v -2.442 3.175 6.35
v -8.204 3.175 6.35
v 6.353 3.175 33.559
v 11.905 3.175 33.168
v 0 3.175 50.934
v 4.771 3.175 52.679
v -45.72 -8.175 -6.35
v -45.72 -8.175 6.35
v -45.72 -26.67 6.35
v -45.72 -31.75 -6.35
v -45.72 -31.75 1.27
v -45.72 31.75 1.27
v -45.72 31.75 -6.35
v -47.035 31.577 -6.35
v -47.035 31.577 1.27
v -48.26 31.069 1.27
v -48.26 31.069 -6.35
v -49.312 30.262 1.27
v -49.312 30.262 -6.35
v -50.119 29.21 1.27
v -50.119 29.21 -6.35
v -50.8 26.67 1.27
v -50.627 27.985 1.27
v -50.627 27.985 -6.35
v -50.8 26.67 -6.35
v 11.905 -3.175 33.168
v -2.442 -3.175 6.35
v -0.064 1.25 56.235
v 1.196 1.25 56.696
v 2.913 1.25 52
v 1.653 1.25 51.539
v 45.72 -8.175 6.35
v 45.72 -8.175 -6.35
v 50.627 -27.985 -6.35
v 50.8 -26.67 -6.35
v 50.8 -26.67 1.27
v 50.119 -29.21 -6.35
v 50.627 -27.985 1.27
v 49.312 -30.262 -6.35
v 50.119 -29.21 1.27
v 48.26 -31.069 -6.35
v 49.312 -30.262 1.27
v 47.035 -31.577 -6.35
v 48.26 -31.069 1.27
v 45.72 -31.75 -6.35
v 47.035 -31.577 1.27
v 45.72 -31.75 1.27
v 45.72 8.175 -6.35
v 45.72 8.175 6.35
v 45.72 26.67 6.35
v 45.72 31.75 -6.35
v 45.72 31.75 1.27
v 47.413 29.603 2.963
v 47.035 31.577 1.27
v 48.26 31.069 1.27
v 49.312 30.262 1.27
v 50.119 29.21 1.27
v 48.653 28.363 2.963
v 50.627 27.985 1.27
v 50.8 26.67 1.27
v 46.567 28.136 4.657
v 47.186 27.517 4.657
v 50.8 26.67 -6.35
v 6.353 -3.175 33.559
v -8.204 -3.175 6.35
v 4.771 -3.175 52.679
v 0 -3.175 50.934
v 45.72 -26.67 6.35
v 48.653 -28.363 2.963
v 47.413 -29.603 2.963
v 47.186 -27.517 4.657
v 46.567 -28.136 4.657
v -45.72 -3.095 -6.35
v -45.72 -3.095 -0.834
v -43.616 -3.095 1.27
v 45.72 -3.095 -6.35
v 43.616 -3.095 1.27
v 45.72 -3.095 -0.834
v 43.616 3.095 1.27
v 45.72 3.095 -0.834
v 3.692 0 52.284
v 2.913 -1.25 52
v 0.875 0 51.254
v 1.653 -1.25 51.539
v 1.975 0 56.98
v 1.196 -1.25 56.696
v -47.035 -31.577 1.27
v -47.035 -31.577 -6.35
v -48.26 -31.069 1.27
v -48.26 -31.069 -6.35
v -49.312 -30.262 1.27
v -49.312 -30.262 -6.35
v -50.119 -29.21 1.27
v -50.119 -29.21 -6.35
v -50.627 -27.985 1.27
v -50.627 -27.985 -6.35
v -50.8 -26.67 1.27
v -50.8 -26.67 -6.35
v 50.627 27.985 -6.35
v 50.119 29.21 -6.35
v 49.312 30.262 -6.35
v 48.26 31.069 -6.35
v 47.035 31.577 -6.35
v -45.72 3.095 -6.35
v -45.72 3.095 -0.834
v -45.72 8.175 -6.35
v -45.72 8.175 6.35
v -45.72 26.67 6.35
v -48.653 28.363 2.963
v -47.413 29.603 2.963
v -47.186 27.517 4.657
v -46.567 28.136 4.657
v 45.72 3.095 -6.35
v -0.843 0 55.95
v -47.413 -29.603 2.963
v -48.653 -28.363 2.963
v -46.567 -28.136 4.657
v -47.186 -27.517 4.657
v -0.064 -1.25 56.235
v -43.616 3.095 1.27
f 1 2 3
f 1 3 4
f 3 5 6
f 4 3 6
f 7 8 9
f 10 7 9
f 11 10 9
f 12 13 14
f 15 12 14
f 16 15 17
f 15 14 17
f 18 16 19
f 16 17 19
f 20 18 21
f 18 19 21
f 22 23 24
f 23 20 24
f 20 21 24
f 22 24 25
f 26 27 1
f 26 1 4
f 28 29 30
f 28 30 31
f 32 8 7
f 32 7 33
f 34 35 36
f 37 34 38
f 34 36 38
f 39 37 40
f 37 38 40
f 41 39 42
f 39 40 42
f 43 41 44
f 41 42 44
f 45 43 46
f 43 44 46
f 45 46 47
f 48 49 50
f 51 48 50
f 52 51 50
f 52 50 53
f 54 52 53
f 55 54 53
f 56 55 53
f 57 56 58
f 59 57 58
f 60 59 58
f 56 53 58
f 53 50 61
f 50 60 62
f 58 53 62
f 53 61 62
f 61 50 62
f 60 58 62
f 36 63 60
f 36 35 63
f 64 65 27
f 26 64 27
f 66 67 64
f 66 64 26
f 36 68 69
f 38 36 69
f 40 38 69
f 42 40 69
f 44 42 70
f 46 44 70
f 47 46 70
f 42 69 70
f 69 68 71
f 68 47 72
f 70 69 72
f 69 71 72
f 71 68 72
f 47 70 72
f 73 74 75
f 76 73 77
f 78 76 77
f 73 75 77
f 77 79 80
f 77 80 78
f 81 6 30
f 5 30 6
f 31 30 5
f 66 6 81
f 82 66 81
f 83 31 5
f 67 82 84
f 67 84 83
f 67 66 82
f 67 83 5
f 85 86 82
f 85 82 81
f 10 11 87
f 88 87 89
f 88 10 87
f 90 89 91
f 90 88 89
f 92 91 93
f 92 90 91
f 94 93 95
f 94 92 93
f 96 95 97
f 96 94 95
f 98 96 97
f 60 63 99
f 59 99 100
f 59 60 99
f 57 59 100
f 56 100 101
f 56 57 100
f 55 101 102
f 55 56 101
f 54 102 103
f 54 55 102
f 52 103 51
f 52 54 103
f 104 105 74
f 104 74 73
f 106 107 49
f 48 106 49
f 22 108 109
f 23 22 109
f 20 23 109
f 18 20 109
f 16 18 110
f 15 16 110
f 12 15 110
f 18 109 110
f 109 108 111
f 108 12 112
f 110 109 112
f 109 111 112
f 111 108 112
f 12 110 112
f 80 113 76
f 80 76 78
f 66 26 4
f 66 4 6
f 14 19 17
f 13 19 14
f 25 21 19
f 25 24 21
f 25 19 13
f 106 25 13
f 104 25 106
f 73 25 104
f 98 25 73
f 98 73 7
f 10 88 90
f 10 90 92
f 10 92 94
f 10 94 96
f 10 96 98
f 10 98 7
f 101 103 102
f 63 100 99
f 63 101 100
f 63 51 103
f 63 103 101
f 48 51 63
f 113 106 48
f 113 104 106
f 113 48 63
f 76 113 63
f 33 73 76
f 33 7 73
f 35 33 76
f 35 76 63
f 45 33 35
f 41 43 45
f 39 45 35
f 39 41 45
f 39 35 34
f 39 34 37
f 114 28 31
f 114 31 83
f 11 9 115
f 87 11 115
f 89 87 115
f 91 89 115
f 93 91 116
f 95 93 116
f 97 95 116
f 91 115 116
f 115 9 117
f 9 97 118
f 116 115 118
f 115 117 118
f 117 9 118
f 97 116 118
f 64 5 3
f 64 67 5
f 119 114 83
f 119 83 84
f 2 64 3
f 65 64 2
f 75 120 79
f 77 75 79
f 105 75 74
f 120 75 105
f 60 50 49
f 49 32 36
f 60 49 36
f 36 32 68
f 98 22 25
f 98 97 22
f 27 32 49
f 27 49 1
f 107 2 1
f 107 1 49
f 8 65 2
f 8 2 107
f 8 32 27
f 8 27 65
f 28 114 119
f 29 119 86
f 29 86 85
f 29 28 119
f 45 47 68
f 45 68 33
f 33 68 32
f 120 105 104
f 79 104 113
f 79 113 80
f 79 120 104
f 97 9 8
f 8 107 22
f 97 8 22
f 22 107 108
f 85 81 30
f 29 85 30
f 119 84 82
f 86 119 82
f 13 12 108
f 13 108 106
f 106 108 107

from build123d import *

# Parameters (mm, degrees)
F1_DEPTH     = 31.75
F2_DEPTH     = 3.175
F3_R         = 5.08
F4_SIZE      = 5.08
F6_DEPTH     = 5
F7_W         = 91.44
F7_H         = 18.495
F7_H_2       = 5.2874810565
F8_DEPTH     = 12.701
F9_T         = 5.08
F9_T3_DEPTH  = 22.86
F9_T5_DEPTH  = 16.51
F9_T7_DEPTH  = 15.9213350007
F9_T9_DEPTH  = 11.66
F9_T11_DEPTH = 11.5016876048
F9_T13_DEPTH = 11.66
F9_T15_DEPTH = 11.66
F9_T17_DEPTH = 11.5016876048
F9_T19_DEPTH = 11.66


# Not quite as in the source:
# - a shell that OpenCascade refuses in one call is made with other operations: the cavity is built on its own and cut out


with BuildPart() as f1:
    # F0 (on Front) → F1 (new body, symmetric)
    with BuildSketch(Plane.XZ):
        Polygon((50.8, -6.35), (50.8, 6.35), (-2.4423953146, 6.35), (-8.2037303153, 6.35), (-50.8, 6.35), (-50.8, -6.35), align=None)
    extrude(amount=F1_DEPTH, both=True)

    # F0 (on Front) → F2 (join, symmetric)
    with BuildSketch(Plane.XZ):
        Polygon((-8.2037303153, 6.35), (-2.4423953146, 6.35), (11.905341187, 33.1679385818), (4.7710500911, 52.6789357495), (0, 50.9343780577), (6.3533243835, 33.5591837482), align=None)
    extrude(amount=F2_DEPTH, both=True)

    # F3
    f3_edges = [f1.edges().sort_by_distance(p)[0] for p in [
        (-50.8, -31.75, 0),
        (50.8, -31.75, 0),
        (50.8, 31.75, 0),
        (-50.8, 31.75, 0),
    ]]
    fillet(f3_edges, radius=F3_R)

    # F4
    f4_edges = [f1.edges().sort_by_distance(p)[0] for p in [
        (50.8, 0, 6.35),
    ]]
    chamfer(f4_edges, length=F4_SIZE)

    # F5 (on face) → F6 (join)
    with BuildSketch(Plane(origin=(-16.4279316214, 0, 44.9274248875), x_dir=(0.9391830795, 0, 0.3434168651), z_dir=(-0.3434168651, 0, 0.9391830795))):
        Polygon((20.5937571299, 1.25), (19.2520695251, 1.25), (18.4229133275, 0), (19.2520695251, -1.25), (20.5937571299, -1.25), (21.4229133275, 0), align=None)
    extrude(amount=F6_DEPTH)

    # F7 (on face) → F8 (cut, through all)
    with BuildSketch(Plane.XY.offset(6.35)):
        with Locations((0, -17.4225)):
            Rectangle(F7_W, F7_H)
        with Locations((0, 17.4225)):
            Rectangle(F7_W, F7_H)
        with Locations((0, -29.3137405282)):
            Rectangle(F7_W, F7_H_2)
        with Locations((0, 29.3137405282)):
            Rectangle(F7_W, F7_H_2)
    extrude(amount=-F8_DEPTH, mode=Mode.SUBTRACT)

    # F9: shell of thickness 5.08, made by hand


with BuildPart() as f9_core1:
    # F9_t2: copy of F1
    add(f1.part)

    # the walls: a layer under each face that stays
    f9_faces = [f9_core1.faces().sort_by_distance(p)[0] for p in [
        (50.8, 0, -2.54),
        (48.26, 0, 3.81),
        (47.5160512242, 28.4660512242, 3.81),
        (45.72, 19.9625, 0),
        (0, 0, 6.35),
        (45.72, -19.9625, 0),
        (47.5160512242, -28.4660512242, 3.81),
        (-50.8, 0, -2.54),
        (-45.72, -19.9625, 0),
        (0, -8.175, 0),
        (0, 8.175, 0),
        (-45.72, 19.9625, 0),
        (-48.26, 0, 3.81),
        (-0.9252029659, 0, 19.9545918741),
        (8.55382927, 3.175, 29.5144678748),
        (8.55382927, -3.175, 29.5144678748),
        (4.7314729362, 0, 19.7589692909),
        (-47.5160512242, 28.4660512242, 3.81),
        (-47.5160512242, -28.4660512242, 3.81),
        (3.1766621917, 0, 42.246780903),
        (8.3381956391, 0, 42.9234371656),
        (3.975875076, 2.1166666667, 52.3881761342),
        (2.444199191, 0.625, 54.4899992105),
        (1.4247893073, 1.25, 54.1172470239),
        (0.4053794236, 0.625, 53.7444948373),
        (0.4053794236, -0.625, 53.7444948373),
        (1.4247893073, -1.25, 54.1172470239),
        (2.444199191, -0.625, 54.4899992105),
        (0.5662471447, 0, 56.4652047226),
    ]]
    thicken(f9_faces, amount=-F9_T, mode=Mode.SUBTRACT)

    # F9_s4 → F9_t3 (cut)
    with BuildSketch(Plane.XY.offset(-11.43)):
        Polygon((45.6692, 8.2258), (50.8, 8.175), (50.8, 3.095), (45.72, 3.095), align=None)
        Polygon((45.6692, -8.2258), (50.8, -8.175), (50.8, -3.095), (45.72, -3.095), align=None)
        Polygon((-45.6692, -8.2258), (-50.8, -8.175), (-50.8, -3.095), (-45.72, -3.095), align=None)
        Polygon((-45.6692, 8.2258), (-45.72, 3.095), (-50.8, 3.095), (-50.8, 8.175), align=None)
    extrude(amount=F9_T3_DEPTH, mode=Mode.SUBTRACT)

    # F9_s6 → F9_t5 (cut)
    with BuildSketch(Plane.XZ.offset(-8.255)):
        Polygon((-8.2485227119, 6.424764165), (-8.2037303153, 1.27), (-5.1602217701, 1.27), (-3.7244906507, 3.9535835029), align=None)
        Polygon((-2.3976029179, 6.376835835), (-2.4423953146, 1.27), (-10.9215566565, 1.27), (-6.9216349791, 8.7464164971), align=None)
        Polygon((6.2608214864, 33.5657023365), (10.832564048, 31.1627672512), (11.9053411319, 33.1679385857), (11.1243744273, 35.3037414227), align=None)
    extrude(amount=F9_T5_DEPTH, mode=Mode.SUBTRACT)

    # F9_s8 → F9_t7 (cut)
    with BuildSketch(Plane.YZ.offset(-13.2837303153)):
        Polygon((3.2258, 6.4008), (3.175, 1.27), (-1.905, 1.27), (-1.905, 6.35), align=None)
        Polygon((-3.2258, 6.4008), (-3.175, 1.27), (1.905, 1.27), (1.905, 6.35), align=None)
    extrude(amount=F9_T7_DEPTH, mode=Mode.SUBTRACT)

    # F9_s10 → F9_t9 (cut)
    with BuildSketch(Plane(origin=(8.7850864423, -14.1016340866, 3.2123096243), x_dir=(-0.8487666121, -0.5287676599, 0), z_dir=(-0.5191529807, 0.8333333333, -0.1898308147))):
        Polygon((-3.1675232496, 51.0265185517), (-4.6144586839, 46.1037076546), (0.2449508944, 44.6229853476), (1.7256732014, 49.4823949258), align=None)
    extrude(amount=F9_T9_DEPTH, mode=Mode.SUBTRACT)

    # F9_s12 → F9_t11 (cut)
    with BuildSketch(Plane(origin=(24.1123582833, 0, 8.8168011877), x_dir=(0, 1, 0), z_dir=(-0.9391830795, 0, -0.3434168651))):
        Polygon((1.3008, -47.8875060361), (1.25, -42.7567060361), (-3.83, -42.7567060361), (-3.83, -47.8367060361), align=None)
    extrude(amount=F9_T11_DEPTH, mode=Mode.SUBTRACT)

    # F9_s14 → F9_t13 (cut)
    with BuildSketch(Plane(origin=(8.7028980905, 13.9697070906, 3.1822570534), x_dir=(0.8487666121, -0.5287676599, 0), z_dir=(-0.5191529807, -0.8333333333, -0.1898308147))):
        Polygon((0.6788933364, 50.2682021828), (2.2230169623, 45.3750057318), (7.0824265406, 46.8557280388), (5.6017042336, 51.7151376171), align=None)
    extrude(amount=F9_T13_DEPTH, mode=Mode.SUBTRACT)

    # F9_s16 → F9_t15 (cut)
    with BuildSketch(Plane(origin=(2.6495743357, -4.253040424, 0.9688297542), x_dir=(0.8487666121, 0.5287676599, 0), z_dir=(0.5191529807, -0.8333333333, 0.1898308147))):
        Polygon((0.6788933364, 50.2682021828), (2.2230169623, 45.3750057318), (7.0824265406, 46.8557280388), (5.6017042336, 51.7151376171), align=None)
    extrude(amount=F9_T15_DEPTH, mode=Mode.SUBTRACT)

    # F9_s18 → F9_t17 (cut)
    with BuildSketch(Plane(origin=(13.3101678993, 0, 4.8669276876), x_dir=(0, 1, 0), z_dir=(0.9391830795, 0, 0.3434168651))):
        Polygon((-1.3008, 47.8875060361), (-1.25, 42.7567060361), (3.83, 42.7567060361), (3.83, 47.8367060361), align=None)
    extrude(amount=F9_T17_DEPTH, mode=Mode.SUBTRACT)

    # F9_s20 → F9_t19 (cut)
    with BuildSketch(Plane(origin=(2.7317626875, 4.38496742, 0.9988823252), x_dir=(-0.8487666121, 0.5287676599, 0), z_dir=(0.5191529807, 0.8333333333, 0.1898308147))):
        Polygon((-3.1675232496, 51.0265185517), (-4.6144586839, 46.1037076546), (0.2449508944, 44.6229853476), (1.7256732014, 49.4823949258), align=None)
    extrude(amount=F9_T19_DEPTH, mode=Mode.SUBTRACT)


with BuildPart() as f1_1:
    add(f1.part)

    # what is left inside the walls is the cavity
    f9_cavity = [f9_core1.part.solids().sort_by_distance(p)[0] for p in [
        (0, 3.0442, -3.81),
    ]]
    add(f9_cavity, mode=Mode.SUBTRACT)


solid = f1_1.part
